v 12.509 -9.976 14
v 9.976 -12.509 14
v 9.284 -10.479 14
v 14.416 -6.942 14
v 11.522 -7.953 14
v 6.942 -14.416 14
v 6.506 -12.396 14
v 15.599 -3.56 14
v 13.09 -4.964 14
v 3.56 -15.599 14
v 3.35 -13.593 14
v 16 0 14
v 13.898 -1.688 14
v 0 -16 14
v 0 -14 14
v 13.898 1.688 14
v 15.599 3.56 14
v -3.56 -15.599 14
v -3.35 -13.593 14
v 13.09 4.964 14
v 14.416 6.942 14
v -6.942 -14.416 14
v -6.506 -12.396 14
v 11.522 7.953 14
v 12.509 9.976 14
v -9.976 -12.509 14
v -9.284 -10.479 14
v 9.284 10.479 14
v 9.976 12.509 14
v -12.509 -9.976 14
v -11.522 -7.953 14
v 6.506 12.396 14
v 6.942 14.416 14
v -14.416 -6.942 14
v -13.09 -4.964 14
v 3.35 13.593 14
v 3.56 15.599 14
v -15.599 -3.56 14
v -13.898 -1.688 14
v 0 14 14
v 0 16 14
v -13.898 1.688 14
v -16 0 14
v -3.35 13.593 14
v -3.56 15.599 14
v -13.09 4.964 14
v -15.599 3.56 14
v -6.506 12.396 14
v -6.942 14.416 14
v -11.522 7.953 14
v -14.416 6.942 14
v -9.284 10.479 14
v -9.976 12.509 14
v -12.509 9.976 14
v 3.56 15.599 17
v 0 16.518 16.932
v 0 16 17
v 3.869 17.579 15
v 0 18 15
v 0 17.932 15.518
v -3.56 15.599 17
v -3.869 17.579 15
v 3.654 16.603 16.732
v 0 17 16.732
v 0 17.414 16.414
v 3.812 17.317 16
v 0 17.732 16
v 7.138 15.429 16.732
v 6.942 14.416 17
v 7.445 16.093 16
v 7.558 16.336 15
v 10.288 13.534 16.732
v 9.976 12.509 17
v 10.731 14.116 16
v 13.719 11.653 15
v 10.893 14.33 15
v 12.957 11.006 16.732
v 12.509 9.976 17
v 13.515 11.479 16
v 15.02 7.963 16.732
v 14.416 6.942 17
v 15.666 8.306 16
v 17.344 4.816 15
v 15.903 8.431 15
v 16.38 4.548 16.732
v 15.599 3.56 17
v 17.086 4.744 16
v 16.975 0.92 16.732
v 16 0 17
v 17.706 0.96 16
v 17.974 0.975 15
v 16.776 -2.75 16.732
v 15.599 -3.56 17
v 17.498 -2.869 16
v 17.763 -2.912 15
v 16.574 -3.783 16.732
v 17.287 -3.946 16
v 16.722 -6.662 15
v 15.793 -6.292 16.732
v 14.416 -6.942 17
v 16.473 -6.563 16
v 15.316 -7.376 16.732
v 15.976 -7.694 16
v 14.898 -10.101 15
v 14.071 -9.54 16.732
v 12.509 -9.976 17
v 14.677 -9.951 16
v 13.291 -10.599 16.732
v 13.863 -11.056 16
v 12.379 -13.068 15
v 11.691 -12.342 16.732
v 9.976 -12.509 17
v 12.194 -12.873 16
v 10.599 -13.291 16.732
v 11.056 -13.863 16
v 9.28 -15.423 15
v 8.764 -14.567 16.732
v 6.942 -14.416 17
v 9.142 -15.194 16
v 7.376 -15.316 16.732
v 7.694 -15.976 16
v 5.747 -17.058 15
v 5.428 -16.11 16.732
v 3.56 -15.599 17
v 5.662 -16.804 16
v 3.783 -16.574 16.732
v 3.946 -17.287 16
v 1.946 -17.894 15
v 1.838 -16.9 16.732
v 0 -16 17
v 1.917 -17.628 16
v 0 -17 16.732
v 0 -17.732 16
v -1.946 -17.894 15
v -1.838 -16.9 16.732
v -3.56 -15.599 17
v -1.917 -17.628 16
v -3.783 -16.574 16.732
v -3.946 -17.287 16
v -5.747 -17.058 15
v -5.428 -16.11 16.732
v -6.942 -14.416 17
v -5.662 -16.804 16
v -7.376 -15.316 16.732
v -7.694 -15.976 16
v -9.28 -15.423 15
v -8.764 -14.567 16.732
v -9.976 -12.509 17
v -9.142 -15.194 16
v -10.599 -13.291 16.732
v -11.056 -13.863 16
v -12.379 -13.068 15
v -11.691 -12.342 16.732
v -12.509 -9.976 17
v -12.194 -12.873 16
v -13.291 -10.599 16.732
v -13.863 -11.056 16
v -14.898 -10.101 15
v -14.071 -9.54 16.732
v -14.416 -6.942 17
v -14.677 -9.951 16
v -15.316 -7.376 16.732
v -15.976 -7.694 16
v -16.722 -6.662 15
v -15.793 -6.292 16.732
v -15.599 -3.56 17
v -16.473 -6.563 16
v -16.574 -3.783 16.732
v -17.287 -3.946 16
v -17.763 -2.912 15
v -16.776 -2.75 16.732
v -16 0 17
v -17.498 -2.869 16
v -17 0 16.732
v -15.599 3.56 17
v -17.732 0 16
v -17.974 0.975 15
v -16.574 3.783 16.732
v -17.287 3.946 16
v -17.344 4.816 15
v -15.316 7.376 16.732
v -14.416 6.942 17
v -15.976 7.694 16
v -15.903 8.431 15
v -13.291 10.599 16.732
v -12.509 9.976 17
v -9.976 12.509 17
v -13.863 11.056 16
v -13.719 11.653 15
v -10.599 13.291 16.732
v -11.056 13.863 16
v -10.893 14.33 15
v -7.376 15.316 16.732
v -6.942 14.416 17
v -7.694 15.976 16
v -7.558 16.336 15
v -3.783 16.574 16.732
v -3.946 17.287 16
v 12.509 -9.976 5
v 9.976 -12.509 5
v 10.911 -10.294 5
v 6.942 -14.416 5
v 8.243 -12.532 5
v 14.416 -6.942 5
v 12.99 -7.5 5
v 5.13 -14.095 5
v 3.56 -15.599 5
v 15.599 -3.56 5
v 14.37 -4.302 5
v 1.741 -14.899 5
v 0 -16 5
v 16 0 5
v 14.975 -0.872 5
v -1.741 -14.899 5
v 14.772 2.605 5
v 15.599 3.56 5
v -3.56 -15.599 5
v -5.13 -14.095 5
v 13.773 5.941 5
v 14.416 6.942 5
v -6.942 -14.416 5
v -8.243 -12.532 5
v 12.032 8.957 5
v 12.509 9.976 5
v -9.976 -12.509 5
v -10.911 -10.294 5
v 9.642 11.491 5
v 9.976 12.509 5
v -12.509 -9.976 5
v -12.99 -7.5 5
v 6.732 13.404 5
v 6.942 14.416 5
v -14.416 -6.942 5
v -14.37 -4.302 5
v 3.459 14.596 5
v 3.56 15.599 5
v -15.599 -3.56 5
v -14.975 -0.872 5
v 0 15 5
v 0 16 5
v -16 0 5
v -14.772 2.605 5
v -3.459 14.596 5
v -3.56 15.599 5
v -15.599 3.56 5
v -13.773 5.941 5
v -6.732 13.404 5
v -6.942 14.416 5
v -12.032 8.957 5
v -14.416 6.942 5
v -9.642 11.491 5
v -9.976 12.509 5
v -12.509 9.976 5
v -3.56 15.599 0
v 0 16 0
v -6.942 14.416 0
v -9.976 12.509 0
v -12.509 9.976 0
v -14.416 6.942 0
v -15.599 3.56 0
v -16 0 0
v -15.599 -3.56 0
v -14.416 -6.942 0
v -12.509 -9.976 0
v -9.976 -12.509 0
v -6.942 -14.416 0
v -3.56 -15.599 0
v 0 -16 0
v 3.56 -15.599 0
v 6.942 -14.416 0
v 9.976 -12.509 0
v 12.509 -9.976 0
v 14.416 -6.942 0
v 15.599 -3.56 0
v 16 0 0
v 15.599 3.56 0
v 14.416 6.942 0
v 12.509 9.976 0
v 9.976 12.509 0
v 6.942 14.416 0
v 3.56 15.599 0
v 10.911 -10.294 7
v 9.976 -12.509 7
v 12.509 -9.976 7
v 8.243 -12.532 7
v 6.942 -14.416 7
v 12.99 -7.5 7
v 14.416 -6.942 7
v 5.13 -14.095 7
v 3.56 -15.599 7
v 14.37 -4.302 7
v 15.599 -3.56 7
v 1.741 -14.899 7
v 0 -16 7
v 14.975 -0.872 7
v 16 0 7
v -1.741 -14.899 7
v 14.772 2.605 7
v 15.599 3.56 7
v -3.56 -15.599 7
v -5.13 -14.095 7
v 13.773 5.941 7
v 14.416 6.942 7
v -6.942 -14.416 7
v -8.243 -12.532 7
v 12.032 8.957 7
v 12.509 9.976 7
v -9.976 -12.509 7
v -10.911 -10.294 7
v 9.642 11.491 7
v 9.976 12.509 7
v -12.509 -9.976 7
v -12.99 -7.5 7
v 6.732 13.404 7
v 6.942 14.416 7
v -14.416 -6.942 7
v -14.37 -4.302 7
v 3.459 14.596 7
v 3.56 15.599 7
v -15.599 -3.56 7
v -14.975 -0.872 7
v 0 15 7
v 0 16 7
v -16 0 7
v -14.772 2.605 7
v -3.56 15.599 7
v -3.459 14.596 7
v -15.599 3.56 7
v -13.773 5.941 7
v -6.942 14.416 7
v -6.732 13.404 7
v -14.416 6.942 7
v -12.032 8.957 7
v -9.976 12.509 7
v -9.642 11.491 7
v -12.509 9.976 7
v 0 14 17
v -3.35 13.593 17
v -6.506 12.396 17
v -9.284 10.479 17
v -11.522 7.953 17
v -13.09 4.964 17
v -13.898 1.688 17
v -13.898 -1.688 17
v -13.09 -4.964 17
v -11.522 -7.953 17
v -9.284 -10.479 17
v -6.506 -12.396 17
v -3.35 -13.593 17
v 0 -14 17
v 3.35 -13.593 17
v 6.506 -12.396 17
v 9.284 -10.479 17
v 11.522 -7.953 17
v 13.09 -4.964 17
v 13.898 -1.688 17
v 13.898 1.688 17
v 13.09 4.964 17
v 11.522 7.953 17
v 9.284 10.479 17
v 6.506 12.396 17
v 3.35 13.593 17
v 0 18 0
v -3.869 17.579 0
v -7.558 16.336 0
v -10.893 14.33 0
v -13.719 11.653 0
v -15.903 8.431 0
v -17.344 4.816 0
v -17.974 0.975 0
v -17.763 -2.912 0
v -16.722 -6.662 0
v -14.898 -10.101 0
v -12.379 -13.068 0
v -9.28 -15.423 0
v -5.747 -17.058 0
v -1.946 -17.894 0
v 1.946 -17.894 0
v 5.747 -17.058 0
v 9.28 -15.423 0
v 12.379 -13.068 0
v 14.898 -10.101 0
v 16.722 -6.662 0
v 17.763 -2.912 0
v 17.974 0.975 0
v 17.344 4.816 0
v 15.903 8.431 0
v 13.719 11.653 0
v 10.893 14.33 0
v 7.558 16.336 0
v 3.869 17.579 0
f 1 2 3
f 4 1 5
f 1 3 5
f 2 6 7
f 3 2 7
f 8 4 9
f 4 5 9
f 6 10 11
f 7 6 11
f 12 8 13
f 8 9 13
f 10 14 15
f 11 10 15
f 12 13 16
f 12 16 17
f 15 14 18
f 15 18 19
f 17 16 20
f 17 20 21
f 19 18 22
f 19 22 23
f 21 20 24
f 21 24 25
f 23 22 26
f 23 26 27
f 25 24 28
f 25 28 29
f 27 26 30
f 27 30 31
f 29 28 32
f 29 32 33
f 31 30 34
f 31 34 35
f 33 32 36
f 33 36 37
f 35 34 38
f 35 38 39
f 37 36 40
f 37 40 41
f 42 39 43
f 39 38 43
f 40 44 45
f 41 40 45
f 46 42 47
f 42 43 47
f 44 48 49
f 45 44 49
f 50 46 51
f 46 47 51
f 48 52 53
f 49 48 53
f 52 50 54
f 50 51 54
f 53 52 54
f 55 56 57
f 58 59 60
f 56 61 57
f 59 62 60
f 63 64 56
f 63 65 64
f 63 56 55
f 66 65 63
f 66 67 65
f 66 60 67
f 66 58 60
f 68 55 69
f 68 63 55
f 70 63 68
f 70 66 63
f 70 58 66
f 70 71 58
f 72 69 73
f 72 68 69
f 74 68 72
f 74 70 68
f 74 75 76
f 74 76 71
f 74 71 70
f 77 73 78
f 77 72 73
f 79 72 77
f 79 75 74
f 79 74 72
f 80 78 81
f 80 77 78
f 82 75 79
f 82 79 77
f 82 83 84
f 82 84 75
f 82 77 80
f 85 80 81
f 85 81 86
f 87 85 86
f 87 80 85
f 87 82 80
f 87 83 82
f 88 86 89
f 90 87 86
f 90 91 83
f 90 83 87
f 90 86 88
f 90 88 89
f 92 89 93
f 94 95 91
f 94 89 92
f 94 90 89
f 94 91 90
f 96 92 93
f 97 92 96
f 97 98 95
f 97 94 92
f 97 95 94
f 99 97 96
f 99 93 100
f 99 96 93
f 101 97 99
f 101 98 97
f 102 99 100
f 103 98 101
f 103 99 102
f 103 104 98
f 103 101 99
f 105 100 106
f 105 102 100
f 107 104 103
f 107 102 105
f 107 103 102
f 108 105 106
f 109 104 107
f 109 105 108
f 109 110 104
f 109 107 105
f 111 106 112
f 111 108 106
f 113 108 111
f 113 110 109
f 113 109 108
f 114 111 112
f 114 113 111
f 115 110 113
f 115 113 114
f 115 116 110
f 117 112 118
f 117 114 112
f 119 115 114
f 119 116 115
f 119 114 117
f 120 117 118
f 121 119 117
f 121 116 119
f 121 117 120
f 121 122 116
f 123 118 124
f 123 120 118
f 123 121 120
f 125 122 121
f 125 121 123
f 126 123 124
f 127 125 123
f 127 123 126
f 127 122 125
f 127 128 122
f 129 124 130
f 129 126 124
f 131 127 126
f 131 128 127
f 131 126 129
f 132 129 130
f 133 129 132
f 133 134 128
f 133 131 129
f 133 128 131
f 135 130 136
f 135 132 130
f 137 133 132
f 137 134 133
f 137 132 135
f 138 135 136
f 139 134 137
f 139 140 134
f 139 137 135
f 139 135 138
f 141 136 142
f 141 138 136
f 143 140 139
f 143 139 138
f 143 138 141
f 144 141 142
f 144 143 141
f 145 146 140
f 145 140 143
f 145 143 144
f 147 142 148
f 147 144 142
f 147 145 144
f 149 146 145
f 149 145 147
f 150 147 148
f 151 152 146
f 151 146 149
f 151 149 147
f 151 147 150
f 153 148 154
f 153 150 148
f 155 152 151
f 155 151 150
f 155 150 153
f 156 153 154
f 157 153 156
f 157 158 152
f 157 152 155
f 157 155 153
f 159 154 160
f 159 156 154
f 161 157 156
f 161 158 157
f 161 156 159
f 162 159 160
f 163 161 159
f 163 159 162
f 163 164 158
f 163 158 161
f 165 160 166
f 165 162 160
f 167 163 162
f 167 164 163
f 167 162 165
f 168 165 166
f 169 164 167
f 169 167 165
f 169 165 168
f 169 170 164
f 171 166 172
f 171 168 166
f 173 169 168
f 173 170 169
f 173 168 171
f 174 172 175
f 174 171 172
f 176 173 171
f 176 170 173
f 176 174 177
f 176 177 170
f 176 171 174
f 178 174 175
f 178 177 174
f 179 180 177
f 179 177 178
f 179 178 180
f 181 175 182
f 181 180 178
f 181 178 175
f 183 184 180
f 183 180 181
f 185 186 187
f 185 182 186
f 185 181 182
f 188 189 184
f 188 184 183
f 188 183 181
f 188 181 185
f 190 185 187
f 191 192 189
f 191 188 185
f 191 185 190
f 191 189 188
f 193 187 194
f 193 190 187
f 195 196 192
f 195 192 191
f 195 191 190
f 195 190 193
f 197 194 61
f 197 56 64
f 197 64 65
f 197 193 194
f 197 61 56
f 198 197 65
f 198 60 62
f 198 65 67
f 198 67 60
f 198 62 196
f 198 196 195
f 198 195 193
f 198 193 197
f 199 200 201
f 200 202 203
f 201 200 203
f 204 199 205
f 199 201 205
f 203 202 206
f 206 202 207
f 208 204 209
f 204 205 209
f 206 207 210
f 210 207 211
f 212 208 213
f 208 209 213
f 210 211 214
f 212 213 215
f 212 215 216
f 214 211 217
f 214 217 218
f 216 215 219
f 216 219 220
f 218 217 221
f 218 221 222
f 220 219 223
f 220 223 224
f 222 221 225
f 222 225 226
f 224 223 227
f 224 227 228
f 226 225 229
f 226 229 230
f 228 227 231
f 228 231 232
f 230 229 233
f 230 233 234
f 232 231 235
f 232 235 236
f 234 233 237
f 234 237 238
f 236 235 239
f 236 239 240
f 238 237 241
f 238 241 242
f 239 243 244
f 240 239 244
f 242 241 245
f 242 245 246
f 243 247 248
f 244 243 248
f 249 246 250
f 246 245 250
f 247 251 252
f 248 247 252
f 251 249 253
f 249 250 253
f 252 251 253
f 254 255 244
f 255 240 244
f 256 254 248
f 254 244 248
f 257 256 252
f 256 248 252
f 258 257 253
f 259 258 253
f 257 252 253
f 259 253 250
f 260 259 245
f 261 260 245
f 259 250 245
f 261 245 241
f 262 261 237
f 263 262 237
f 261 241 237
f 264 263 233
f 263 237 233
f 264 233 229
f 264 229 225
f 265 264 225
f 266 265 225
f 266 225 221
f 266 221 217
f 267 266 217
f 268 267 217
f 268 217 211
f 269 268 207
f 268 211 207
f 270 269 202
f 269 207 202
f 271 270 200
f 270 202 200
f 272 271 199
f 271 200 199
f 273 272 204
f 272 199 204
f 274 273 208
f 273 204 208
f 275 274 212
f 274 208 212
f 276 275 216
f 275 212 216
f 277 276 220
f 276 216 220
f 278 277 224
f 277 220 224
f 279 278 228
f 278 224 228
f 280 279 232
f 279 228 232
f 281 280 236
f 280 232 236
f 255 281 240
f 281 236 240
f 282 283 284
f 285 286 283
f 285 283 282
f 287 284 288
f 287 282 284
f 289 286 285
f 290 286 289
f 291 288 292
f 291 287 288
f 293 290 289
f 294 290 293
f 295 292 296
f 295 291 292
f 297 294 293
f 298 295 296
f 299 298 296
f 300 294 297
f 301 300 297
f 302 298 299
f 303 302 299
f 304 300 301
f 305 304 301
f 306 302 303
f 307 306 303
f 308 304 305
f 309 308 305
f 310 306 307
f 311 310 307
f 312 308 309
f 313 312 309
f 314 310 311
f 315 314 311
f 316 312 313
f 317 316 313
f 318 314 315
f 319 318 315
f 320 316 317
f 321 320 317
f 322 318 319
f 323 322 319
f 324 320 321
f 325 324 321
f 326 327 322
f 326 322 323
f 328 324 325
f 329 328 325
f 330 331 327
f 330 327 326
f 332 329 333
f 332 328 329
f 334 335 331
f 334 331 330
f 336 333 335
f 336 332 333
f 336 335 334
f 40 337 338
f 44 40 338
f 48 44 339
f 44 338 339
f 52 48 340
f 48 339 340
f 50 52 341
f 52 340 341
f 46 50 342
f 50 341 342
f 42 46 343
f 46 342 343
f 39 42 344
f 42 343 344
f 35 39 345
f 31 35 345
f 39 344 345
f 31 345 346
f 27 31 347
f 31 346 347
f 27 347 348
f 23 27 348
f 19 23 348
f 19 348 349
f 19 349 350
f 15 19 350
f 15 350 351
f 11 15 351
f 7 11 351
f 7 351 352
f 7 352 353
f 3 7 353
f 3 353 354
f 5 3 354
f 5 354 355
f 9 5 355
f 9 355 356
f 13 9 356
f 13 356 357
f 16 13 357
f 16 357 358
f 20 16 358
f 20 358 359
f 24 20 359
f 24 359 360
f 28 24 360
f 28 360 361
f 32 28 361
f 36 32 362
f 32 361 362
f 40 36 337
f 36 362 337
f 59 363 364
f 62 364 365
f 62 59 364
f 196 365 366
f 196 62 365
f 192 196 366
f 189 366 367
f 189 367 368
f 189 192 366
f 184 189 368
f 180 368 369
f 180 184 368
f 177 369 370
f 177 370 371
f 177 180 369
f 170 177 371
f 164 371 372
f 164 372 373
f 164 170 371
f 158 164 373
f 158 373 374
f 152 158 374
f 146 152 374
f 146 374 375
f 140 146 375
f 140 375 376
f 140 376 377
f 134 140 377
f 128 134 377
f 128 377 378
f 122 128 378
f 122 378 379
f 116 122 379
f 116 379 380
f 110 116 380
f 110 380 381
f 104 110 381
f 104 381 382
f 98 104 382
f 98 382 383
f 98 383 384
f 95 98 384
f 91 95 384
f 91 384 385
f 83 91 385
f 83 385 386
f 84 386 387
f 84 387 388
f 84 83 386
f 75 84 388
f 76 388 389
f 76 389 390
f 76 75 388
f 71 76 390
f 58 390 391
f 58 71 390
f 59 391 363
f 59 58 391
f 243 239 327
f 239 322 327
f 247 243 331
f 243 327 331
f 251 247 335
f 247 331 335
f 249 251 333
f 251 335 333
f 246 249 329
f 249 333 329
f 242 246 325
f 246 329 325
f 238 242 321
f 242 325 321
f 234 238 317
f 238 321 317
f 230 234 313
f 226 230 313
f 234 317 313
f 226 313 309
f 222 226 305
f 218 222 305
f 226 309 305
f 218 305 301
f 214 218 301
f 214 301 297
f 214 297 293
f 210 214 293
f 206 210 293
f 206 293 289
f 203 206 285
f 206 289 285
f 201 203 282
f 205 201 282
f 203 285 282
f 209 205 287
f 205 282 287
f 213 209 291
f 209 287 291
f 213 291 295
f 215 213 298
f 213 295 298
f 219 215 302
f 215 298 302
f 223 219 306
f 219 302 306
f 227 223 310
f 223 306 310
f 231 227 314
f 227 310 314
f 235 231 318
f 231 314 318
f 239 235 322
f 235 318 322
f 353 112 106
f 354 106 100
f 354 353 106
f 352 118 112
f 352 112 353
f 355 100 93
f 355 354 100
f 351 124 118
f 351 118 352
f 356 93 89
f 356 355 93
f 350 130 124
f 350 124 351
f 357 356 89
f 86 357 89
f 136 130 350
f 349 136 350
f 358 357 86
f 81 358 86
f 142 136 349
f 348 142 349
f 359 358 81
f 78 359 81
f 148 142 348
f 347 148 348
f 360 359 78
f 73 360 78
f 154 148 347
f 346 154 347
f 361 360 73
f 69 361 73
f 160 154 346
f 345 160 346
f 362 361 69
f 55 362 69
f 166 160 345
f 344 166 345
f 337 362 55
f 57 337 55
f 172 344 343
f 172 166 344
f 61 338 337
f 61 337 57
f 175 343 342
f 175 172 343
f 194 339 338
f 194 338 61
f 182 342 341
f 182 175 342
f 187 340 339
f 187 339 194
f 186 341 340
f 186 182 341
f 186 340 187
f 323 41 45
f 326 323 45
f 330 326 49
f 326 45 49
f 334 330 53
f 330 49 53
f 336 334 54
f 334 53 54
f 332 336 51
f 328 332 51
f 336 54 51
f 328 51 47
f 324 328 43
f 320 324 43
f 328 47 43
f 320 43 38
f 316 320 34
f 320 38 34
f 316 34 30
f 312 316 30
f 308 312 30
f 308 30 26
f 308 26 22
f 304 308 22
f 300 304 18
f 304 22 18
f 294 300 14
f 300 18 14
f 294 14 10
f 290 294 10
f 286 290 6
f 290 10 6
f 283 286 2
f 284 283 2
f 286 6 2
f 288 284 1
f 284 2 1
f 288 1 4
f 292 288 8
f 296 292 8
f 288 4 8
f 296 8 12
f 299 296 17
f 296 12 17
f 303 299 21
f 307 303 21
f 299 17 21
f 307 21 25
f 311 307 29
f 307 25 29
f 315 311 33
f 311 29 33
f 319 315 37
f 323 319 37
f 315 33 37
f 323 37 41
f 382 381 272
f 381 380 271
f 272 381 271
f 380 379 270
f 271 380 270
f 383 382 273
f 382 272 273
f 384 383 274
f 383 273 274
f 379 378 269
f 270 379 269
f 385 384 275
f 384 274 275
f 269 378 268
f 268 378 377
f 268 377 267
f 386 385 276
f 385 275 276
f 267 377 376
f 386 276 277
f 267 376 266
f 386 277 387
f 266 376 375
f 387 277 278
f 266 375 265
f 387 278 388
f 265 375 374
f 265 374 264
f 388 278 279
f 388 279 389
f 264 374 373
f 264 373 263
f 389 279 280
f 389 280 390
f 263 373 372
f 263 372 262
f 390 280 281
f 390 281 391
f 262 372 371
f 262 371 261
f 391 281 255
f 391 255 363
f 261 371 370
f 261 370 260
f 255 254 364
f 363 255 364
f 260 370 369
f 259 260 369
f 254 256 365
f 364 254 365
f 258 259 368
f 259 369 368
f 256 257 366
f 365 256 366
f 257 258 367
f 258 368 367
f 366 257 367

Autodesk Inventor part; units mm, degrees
ref_plane "YZ Plane" through (0, 0, 0) normal (1, 0, 0) x (0, 1, 0)
ref_plane "XZ Plane" through (0, 0, 0) normal (0, 1, 0) x (-1, 0, 0)
ref_plane "XY Plane" through (0, 0, 0) normal (0, 0, 1) x (1, 0, 0)
sketch "Sketch1" plane through (0, 0, 0) normal (1, 0, 0) x (0, 1, 0)
  line L0 (16, 0) -> (16, 5)
  line L1 (16, 5) -> (15, 5)
  line L2 (15, 5) -> (15, 7)
  line L3 (15, 7) -> (16, 7)
  line L4 (16, 7) -> (16, 14)
  line L5 (16, 14) -> (14, 14)
  line L6 (14, 14) -> (14, 17)
  line L7 (18, 0) -> (18, 17)
  line L8 (18, 17) -> (14, 17)
  line L9 (16, 0) -> (18, 0)
  line L10 (0, 0) -> (0, 15) construction
  dimension "d0" = 5
  dimension "d1" = 16
  dimension "d2" = 1
  dimension "d3" = 2
  dimension "d4" = 7
  dimension "d8" = 14
  dimension "d9" = 3
  dimension "d10" = 18
revolve "Revolution1" add sketch "Sketch1" angle 360 about axis through (0, 0, 0) along (0, 0, 1)
thread "Thread1" size "M28x2" class "6H" standard "ANSI Metric M Profile" full length
fillet "Fillet1" radius 2 1 edges at (0, -18, 17)
properties part number "201-02" material "PC/ABS Plastic"
